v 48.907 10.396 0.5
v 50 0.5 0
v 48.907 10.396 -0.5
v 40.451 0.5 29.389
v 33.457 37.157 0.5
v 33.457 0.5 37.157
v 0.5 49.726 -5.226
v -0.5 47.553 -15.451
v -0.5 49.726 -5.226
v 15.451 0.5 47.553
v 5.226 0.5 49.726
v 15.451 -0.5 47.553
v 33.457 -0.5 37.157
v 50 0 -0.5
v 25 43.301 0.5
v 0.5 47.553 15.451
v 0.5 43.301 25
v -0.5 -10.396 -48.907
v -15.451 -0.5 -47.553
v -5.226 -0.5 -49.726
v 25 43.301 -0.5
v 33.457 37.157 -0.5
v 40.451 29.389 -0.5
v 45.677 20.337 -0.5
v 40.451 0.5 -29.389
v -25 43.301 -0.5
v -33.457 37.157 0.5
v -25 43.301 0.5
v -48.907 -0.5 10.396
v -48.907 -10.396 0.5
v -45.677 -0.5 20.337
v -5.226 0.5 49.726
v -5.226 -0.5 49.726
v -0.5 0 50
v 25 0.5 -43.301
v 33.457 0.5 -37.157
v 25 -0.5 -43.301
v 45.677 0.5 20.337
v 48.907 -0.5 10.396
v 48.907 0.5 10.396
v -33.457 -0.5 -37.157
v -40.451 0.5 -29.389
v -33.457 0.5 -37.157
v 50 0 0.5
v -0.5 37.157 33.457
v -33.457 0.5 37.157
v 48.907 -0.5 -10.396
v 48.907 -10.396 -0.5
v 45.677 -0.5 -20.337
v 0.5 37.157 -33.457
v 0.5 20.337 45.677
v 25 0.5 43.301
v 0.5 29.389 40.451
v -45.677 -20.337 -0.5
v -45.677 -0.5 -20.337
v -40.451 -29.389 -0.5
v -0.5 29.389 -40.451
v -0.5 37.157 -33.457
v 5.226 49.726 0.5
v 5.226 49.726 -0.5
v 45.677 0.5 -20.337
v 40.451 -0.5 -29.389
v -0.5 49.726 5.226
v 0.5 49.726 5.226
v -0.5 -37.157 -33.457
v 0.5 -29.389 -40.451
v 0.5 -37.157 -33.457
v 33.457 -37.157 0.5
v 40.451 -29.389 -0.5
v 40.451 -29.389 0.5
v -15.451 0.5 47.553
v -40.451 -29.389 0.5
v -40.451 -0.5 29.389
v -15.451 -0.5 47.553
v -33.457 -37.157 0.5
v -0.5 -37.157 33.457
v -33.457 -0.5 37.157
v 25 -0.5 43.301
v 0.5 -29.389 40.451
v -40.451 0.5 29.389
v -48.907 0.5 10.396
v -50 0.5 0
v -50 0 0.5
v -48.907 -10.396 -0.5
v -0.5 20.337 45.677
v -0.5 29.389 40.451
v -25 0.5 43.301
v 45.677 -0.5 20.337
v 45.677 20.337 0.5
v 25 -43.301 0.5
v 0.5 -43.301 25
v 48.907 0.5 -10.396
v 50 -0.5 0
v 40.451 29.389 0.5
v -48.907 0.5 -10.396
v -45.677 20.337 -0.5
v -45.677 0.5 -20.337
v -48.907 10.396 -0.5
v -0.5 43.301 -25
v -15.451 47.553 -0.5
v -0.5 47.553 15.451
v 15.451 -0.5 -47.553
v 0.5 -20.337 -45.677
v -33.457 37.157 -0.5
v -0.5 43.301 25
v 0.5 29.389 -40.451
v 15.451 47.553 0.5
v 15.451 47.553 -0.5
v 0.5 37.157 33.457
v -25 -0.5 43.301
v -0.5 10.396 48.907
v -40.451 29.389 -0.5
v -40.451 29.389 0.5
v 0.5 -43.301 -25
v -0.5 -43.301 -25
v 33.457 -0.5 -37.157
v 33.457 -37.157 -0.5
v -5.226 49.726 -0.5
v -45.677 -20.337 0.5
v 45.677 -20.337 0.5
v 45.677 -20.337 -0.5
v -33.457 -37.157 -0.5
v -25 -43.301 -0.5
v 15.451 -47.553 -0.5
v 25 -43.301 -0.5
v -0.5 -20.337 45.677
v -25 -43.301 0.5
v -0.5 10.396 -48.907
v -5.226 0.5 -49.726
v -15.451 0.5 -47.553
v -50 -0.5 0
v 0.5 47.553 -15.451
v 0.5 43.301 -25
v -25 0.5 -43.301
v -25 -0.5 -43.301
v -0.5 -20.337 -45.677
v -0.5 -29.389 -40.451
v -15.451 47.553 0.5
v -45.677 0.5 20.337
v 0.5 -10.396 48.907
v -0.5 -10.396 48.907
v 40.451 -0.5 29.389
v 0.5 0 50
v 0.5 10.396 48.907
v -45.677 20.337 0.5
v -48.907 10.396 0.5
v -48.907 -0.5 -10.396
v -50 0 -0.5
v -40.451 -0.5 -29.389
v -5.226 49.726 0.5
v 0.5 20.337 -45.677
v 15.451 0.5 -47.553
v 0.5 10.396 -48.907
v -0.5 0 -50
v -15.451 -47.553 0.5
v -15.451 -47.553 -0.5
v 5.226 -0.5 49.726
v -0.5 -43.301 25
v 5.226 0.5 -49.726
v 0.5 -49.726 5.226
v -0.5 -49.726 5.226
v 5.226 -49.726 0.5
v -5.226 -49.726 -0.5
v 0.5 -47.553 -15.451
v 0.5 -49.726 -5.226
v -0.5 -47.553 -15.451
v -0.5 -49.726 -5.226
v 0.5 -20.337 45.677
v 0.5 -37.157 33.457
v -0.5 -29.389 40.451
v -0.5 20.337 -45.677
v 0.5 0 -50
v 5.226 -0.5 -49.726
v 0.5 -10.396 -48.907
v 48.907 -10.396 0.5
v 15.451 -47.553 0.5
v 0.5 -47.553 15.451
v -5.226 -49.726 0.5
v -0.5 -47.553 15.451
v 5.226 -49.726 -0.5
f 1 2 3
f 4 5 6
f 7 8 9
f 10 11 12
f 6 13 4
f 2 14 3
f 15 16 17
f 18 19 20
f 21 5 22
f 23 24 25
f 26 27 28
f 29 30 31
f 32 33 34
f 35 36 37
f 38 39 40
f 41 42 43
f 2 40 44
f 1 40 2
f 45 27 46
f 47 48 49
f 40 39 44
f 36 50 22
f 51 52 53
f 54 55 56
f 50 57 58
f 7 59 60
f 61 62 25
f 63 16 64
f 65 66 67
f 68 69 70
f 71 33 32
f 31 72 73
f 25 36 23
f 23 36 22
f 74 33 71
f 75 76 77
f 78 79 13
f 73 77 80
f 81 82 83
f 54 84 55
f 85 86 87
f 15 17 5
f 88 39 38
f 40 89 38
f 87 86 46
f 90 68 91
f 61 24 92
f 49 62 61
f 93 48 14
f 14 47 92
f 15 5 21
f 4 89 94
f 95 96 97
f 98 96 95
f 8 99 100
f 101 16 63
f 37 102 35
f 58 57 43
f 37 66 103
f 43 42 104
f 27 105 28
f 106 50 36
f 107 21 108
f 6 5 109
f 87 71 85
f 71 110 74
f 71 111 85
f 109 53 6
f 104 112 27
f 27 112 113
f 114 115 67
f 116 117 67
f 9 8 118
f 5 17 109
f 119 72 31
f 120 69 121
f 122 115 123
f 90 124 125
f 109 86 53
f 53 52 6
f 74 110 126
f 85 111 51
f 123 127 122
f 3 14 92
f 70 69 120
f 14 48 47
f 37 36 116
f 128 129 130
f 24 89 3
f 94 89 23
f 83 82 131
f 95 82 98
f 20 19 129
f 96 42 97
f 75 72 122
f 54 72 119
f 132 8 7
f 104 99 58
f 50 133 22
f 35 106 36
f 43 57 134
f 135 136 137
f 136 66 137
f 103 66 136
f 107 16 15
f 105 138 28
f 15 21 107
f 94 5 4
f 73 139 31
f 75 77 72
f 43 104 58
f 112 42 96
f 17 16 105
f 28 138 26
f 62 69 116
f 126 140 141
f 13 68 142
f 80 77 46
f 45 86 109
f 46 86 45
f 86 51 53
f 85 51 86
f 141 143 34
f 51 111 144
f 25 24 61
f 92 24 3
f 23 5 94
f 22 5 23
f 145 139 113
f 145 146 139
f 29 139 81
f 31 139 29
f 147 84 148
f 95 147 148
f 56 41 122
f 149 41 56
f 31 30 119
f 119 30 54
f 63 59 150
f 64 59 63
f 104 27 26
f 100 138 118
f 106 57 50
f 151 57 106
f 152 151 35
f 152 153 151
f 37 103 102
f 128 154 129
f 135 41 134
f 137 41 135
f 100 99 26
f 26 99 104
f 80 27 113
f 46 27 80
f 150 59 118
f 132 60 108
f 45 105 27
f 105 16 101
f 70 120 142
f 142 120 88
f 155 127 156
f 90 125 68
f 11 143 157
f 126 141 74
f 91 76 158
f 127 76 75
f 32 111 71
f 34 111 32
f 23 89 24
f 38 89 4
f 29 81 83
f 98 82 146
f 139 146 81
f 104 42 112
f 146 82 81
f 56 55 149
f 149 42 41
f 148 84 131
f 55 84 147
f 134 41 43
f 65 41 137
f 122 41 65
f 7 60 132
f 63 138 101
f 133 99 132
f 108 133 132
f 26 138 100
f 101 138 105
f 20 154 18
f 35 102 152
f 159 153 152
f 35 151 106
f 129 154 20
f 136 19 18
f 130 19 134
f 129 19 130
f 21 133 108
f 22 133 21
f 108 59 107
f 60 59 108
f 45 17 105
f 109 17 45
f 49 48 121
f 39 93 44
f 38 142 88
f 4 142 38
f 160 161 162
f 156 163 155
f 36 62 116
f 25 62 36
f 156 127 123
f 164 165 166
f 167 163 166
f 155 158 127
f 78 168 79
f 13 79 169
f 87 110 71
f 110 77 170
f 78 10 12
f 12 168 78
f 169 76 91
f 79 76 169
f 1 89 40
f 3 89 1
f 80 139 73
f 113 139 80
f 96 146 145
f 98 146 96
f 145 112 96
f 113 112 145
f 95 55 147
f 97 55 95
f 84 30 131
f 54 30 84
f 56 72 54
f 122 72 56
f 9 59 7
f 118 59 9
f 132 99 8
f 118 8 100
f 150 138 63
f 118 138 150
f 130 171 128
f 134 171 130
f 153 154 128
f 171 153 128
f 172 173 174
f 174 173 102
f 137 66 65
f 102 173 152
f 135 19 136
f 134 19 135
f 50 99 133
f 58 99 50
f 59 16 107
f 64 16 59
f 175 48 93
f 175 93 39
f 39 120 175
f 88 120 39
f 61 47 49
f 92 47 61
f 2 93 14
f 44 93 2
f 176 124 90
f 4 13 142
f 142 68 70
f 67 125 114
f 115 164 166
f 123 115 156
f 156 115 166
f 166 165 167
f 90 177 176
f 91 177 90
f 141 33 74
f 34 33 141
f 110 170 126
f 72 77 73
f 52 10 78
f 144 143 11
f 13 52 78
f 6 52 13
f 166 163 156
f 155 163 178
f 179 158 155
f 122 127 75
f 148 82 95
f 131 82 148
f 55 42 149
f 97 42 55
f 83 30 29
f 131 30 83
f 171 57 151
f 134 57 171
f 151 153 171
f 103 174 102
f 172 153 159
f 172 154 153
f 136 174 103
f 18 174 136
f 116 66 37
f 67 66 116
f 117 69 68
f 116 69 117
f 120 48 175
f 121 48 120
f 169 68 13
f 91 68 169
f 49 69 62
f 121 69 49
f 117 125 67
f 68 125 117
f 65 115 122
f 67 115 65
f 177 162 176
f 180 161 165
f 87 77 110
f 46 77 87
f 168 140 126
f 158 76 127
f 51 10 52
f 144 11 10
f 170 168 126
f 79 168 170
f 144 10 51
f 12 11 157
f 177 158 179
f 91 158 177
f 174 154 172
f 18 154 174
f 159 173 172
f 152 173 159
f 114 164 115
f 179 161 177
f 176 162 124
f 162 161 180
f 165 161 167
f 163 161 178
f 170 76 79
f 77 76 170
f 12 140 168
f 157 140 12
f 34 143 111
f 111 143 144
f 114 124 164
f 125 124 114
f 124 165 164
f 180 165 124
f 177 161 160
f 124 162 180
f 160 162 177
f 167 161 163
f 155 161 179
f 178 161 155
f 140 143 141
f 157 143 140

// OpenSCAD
 /*
  * Copyright [2017] [Saul Castro]

    Licensed under the Apache License, Version 2.0 (the "License");
    you may not use this file except in compliance with the License.
    You may obtain a copy of the License at
    
        http://www.apache.org/licenses/LICENSE-2.0
    
    Unless required by applicable law or agreed to in writing, software
    distributed under the License is distributed on an "AS IS" BASIS,
    WITHOUT WARRANTIES OR CONDITIONS OF ANY KIND, either express or implied.
    See the License for the specific language governing permissions and
    limitations under the License.

  */
  
  
/*==================================================
==================	Extention of basic shape with shot sintax =====================
==================================================*/
//all shapes centered at 0, 0 for easy rotation

// r prefix rounded
// rrc(10, 20 ,30, 4, 5);

fn = 50;


sp(100, fn);

module c(w, l, d){
    translate([0,0,0]) cube([w, l, d], center=true);
}

module cy(d, h){  
    translate([0,0,0])    cylinder(d=d, h=h, $fn=fn, center=true);
}
module cy(d, h, f){  
    translate([0,0,0])    cylinder(d=d, h=h, $fn=f, center=true);
}

module sp(d, f){  
    hull(){
    translate([0,0,0])    cy(d, 1);
    rotate([0,90,0])    cy(d, 1);
    rotate([90,0,0])    cy(d, 1); 
//    translate([0,0,0])    cy(1, d);
    }
} 

module rcy(d, h, c, fn){
	minkowski(){
			sp(c);
			cy(d-c, h-c, fn);
        }
}

module rc(w, l, d, c){
    hull(){
            translate([w/2-c/2,l/2-c/2,0]) cy(c, d);
            translate([w/2-c/2,-l/2+c/2,0]) cy(c, d);
            translate([-(w/2-c/2),l/2-c/2,0]) cy(c, d);
            translate([-(w/2-c/2),-l/2+c/2,0]) cy(c, d);
    }
    
}

module rrc(w, h, d, c, s){
          translate([0,0,0])  minkowski(){
			sp(s);
			rc(w-s, h-s, d-s, c);
        }
}



module slot(d, l, h){
    hull(){
         translate([0,l/2-d/2,0]) cy(d, h);
            translate([0,-l/2+d/2,0]) cy(d, h);
    }
    
}
